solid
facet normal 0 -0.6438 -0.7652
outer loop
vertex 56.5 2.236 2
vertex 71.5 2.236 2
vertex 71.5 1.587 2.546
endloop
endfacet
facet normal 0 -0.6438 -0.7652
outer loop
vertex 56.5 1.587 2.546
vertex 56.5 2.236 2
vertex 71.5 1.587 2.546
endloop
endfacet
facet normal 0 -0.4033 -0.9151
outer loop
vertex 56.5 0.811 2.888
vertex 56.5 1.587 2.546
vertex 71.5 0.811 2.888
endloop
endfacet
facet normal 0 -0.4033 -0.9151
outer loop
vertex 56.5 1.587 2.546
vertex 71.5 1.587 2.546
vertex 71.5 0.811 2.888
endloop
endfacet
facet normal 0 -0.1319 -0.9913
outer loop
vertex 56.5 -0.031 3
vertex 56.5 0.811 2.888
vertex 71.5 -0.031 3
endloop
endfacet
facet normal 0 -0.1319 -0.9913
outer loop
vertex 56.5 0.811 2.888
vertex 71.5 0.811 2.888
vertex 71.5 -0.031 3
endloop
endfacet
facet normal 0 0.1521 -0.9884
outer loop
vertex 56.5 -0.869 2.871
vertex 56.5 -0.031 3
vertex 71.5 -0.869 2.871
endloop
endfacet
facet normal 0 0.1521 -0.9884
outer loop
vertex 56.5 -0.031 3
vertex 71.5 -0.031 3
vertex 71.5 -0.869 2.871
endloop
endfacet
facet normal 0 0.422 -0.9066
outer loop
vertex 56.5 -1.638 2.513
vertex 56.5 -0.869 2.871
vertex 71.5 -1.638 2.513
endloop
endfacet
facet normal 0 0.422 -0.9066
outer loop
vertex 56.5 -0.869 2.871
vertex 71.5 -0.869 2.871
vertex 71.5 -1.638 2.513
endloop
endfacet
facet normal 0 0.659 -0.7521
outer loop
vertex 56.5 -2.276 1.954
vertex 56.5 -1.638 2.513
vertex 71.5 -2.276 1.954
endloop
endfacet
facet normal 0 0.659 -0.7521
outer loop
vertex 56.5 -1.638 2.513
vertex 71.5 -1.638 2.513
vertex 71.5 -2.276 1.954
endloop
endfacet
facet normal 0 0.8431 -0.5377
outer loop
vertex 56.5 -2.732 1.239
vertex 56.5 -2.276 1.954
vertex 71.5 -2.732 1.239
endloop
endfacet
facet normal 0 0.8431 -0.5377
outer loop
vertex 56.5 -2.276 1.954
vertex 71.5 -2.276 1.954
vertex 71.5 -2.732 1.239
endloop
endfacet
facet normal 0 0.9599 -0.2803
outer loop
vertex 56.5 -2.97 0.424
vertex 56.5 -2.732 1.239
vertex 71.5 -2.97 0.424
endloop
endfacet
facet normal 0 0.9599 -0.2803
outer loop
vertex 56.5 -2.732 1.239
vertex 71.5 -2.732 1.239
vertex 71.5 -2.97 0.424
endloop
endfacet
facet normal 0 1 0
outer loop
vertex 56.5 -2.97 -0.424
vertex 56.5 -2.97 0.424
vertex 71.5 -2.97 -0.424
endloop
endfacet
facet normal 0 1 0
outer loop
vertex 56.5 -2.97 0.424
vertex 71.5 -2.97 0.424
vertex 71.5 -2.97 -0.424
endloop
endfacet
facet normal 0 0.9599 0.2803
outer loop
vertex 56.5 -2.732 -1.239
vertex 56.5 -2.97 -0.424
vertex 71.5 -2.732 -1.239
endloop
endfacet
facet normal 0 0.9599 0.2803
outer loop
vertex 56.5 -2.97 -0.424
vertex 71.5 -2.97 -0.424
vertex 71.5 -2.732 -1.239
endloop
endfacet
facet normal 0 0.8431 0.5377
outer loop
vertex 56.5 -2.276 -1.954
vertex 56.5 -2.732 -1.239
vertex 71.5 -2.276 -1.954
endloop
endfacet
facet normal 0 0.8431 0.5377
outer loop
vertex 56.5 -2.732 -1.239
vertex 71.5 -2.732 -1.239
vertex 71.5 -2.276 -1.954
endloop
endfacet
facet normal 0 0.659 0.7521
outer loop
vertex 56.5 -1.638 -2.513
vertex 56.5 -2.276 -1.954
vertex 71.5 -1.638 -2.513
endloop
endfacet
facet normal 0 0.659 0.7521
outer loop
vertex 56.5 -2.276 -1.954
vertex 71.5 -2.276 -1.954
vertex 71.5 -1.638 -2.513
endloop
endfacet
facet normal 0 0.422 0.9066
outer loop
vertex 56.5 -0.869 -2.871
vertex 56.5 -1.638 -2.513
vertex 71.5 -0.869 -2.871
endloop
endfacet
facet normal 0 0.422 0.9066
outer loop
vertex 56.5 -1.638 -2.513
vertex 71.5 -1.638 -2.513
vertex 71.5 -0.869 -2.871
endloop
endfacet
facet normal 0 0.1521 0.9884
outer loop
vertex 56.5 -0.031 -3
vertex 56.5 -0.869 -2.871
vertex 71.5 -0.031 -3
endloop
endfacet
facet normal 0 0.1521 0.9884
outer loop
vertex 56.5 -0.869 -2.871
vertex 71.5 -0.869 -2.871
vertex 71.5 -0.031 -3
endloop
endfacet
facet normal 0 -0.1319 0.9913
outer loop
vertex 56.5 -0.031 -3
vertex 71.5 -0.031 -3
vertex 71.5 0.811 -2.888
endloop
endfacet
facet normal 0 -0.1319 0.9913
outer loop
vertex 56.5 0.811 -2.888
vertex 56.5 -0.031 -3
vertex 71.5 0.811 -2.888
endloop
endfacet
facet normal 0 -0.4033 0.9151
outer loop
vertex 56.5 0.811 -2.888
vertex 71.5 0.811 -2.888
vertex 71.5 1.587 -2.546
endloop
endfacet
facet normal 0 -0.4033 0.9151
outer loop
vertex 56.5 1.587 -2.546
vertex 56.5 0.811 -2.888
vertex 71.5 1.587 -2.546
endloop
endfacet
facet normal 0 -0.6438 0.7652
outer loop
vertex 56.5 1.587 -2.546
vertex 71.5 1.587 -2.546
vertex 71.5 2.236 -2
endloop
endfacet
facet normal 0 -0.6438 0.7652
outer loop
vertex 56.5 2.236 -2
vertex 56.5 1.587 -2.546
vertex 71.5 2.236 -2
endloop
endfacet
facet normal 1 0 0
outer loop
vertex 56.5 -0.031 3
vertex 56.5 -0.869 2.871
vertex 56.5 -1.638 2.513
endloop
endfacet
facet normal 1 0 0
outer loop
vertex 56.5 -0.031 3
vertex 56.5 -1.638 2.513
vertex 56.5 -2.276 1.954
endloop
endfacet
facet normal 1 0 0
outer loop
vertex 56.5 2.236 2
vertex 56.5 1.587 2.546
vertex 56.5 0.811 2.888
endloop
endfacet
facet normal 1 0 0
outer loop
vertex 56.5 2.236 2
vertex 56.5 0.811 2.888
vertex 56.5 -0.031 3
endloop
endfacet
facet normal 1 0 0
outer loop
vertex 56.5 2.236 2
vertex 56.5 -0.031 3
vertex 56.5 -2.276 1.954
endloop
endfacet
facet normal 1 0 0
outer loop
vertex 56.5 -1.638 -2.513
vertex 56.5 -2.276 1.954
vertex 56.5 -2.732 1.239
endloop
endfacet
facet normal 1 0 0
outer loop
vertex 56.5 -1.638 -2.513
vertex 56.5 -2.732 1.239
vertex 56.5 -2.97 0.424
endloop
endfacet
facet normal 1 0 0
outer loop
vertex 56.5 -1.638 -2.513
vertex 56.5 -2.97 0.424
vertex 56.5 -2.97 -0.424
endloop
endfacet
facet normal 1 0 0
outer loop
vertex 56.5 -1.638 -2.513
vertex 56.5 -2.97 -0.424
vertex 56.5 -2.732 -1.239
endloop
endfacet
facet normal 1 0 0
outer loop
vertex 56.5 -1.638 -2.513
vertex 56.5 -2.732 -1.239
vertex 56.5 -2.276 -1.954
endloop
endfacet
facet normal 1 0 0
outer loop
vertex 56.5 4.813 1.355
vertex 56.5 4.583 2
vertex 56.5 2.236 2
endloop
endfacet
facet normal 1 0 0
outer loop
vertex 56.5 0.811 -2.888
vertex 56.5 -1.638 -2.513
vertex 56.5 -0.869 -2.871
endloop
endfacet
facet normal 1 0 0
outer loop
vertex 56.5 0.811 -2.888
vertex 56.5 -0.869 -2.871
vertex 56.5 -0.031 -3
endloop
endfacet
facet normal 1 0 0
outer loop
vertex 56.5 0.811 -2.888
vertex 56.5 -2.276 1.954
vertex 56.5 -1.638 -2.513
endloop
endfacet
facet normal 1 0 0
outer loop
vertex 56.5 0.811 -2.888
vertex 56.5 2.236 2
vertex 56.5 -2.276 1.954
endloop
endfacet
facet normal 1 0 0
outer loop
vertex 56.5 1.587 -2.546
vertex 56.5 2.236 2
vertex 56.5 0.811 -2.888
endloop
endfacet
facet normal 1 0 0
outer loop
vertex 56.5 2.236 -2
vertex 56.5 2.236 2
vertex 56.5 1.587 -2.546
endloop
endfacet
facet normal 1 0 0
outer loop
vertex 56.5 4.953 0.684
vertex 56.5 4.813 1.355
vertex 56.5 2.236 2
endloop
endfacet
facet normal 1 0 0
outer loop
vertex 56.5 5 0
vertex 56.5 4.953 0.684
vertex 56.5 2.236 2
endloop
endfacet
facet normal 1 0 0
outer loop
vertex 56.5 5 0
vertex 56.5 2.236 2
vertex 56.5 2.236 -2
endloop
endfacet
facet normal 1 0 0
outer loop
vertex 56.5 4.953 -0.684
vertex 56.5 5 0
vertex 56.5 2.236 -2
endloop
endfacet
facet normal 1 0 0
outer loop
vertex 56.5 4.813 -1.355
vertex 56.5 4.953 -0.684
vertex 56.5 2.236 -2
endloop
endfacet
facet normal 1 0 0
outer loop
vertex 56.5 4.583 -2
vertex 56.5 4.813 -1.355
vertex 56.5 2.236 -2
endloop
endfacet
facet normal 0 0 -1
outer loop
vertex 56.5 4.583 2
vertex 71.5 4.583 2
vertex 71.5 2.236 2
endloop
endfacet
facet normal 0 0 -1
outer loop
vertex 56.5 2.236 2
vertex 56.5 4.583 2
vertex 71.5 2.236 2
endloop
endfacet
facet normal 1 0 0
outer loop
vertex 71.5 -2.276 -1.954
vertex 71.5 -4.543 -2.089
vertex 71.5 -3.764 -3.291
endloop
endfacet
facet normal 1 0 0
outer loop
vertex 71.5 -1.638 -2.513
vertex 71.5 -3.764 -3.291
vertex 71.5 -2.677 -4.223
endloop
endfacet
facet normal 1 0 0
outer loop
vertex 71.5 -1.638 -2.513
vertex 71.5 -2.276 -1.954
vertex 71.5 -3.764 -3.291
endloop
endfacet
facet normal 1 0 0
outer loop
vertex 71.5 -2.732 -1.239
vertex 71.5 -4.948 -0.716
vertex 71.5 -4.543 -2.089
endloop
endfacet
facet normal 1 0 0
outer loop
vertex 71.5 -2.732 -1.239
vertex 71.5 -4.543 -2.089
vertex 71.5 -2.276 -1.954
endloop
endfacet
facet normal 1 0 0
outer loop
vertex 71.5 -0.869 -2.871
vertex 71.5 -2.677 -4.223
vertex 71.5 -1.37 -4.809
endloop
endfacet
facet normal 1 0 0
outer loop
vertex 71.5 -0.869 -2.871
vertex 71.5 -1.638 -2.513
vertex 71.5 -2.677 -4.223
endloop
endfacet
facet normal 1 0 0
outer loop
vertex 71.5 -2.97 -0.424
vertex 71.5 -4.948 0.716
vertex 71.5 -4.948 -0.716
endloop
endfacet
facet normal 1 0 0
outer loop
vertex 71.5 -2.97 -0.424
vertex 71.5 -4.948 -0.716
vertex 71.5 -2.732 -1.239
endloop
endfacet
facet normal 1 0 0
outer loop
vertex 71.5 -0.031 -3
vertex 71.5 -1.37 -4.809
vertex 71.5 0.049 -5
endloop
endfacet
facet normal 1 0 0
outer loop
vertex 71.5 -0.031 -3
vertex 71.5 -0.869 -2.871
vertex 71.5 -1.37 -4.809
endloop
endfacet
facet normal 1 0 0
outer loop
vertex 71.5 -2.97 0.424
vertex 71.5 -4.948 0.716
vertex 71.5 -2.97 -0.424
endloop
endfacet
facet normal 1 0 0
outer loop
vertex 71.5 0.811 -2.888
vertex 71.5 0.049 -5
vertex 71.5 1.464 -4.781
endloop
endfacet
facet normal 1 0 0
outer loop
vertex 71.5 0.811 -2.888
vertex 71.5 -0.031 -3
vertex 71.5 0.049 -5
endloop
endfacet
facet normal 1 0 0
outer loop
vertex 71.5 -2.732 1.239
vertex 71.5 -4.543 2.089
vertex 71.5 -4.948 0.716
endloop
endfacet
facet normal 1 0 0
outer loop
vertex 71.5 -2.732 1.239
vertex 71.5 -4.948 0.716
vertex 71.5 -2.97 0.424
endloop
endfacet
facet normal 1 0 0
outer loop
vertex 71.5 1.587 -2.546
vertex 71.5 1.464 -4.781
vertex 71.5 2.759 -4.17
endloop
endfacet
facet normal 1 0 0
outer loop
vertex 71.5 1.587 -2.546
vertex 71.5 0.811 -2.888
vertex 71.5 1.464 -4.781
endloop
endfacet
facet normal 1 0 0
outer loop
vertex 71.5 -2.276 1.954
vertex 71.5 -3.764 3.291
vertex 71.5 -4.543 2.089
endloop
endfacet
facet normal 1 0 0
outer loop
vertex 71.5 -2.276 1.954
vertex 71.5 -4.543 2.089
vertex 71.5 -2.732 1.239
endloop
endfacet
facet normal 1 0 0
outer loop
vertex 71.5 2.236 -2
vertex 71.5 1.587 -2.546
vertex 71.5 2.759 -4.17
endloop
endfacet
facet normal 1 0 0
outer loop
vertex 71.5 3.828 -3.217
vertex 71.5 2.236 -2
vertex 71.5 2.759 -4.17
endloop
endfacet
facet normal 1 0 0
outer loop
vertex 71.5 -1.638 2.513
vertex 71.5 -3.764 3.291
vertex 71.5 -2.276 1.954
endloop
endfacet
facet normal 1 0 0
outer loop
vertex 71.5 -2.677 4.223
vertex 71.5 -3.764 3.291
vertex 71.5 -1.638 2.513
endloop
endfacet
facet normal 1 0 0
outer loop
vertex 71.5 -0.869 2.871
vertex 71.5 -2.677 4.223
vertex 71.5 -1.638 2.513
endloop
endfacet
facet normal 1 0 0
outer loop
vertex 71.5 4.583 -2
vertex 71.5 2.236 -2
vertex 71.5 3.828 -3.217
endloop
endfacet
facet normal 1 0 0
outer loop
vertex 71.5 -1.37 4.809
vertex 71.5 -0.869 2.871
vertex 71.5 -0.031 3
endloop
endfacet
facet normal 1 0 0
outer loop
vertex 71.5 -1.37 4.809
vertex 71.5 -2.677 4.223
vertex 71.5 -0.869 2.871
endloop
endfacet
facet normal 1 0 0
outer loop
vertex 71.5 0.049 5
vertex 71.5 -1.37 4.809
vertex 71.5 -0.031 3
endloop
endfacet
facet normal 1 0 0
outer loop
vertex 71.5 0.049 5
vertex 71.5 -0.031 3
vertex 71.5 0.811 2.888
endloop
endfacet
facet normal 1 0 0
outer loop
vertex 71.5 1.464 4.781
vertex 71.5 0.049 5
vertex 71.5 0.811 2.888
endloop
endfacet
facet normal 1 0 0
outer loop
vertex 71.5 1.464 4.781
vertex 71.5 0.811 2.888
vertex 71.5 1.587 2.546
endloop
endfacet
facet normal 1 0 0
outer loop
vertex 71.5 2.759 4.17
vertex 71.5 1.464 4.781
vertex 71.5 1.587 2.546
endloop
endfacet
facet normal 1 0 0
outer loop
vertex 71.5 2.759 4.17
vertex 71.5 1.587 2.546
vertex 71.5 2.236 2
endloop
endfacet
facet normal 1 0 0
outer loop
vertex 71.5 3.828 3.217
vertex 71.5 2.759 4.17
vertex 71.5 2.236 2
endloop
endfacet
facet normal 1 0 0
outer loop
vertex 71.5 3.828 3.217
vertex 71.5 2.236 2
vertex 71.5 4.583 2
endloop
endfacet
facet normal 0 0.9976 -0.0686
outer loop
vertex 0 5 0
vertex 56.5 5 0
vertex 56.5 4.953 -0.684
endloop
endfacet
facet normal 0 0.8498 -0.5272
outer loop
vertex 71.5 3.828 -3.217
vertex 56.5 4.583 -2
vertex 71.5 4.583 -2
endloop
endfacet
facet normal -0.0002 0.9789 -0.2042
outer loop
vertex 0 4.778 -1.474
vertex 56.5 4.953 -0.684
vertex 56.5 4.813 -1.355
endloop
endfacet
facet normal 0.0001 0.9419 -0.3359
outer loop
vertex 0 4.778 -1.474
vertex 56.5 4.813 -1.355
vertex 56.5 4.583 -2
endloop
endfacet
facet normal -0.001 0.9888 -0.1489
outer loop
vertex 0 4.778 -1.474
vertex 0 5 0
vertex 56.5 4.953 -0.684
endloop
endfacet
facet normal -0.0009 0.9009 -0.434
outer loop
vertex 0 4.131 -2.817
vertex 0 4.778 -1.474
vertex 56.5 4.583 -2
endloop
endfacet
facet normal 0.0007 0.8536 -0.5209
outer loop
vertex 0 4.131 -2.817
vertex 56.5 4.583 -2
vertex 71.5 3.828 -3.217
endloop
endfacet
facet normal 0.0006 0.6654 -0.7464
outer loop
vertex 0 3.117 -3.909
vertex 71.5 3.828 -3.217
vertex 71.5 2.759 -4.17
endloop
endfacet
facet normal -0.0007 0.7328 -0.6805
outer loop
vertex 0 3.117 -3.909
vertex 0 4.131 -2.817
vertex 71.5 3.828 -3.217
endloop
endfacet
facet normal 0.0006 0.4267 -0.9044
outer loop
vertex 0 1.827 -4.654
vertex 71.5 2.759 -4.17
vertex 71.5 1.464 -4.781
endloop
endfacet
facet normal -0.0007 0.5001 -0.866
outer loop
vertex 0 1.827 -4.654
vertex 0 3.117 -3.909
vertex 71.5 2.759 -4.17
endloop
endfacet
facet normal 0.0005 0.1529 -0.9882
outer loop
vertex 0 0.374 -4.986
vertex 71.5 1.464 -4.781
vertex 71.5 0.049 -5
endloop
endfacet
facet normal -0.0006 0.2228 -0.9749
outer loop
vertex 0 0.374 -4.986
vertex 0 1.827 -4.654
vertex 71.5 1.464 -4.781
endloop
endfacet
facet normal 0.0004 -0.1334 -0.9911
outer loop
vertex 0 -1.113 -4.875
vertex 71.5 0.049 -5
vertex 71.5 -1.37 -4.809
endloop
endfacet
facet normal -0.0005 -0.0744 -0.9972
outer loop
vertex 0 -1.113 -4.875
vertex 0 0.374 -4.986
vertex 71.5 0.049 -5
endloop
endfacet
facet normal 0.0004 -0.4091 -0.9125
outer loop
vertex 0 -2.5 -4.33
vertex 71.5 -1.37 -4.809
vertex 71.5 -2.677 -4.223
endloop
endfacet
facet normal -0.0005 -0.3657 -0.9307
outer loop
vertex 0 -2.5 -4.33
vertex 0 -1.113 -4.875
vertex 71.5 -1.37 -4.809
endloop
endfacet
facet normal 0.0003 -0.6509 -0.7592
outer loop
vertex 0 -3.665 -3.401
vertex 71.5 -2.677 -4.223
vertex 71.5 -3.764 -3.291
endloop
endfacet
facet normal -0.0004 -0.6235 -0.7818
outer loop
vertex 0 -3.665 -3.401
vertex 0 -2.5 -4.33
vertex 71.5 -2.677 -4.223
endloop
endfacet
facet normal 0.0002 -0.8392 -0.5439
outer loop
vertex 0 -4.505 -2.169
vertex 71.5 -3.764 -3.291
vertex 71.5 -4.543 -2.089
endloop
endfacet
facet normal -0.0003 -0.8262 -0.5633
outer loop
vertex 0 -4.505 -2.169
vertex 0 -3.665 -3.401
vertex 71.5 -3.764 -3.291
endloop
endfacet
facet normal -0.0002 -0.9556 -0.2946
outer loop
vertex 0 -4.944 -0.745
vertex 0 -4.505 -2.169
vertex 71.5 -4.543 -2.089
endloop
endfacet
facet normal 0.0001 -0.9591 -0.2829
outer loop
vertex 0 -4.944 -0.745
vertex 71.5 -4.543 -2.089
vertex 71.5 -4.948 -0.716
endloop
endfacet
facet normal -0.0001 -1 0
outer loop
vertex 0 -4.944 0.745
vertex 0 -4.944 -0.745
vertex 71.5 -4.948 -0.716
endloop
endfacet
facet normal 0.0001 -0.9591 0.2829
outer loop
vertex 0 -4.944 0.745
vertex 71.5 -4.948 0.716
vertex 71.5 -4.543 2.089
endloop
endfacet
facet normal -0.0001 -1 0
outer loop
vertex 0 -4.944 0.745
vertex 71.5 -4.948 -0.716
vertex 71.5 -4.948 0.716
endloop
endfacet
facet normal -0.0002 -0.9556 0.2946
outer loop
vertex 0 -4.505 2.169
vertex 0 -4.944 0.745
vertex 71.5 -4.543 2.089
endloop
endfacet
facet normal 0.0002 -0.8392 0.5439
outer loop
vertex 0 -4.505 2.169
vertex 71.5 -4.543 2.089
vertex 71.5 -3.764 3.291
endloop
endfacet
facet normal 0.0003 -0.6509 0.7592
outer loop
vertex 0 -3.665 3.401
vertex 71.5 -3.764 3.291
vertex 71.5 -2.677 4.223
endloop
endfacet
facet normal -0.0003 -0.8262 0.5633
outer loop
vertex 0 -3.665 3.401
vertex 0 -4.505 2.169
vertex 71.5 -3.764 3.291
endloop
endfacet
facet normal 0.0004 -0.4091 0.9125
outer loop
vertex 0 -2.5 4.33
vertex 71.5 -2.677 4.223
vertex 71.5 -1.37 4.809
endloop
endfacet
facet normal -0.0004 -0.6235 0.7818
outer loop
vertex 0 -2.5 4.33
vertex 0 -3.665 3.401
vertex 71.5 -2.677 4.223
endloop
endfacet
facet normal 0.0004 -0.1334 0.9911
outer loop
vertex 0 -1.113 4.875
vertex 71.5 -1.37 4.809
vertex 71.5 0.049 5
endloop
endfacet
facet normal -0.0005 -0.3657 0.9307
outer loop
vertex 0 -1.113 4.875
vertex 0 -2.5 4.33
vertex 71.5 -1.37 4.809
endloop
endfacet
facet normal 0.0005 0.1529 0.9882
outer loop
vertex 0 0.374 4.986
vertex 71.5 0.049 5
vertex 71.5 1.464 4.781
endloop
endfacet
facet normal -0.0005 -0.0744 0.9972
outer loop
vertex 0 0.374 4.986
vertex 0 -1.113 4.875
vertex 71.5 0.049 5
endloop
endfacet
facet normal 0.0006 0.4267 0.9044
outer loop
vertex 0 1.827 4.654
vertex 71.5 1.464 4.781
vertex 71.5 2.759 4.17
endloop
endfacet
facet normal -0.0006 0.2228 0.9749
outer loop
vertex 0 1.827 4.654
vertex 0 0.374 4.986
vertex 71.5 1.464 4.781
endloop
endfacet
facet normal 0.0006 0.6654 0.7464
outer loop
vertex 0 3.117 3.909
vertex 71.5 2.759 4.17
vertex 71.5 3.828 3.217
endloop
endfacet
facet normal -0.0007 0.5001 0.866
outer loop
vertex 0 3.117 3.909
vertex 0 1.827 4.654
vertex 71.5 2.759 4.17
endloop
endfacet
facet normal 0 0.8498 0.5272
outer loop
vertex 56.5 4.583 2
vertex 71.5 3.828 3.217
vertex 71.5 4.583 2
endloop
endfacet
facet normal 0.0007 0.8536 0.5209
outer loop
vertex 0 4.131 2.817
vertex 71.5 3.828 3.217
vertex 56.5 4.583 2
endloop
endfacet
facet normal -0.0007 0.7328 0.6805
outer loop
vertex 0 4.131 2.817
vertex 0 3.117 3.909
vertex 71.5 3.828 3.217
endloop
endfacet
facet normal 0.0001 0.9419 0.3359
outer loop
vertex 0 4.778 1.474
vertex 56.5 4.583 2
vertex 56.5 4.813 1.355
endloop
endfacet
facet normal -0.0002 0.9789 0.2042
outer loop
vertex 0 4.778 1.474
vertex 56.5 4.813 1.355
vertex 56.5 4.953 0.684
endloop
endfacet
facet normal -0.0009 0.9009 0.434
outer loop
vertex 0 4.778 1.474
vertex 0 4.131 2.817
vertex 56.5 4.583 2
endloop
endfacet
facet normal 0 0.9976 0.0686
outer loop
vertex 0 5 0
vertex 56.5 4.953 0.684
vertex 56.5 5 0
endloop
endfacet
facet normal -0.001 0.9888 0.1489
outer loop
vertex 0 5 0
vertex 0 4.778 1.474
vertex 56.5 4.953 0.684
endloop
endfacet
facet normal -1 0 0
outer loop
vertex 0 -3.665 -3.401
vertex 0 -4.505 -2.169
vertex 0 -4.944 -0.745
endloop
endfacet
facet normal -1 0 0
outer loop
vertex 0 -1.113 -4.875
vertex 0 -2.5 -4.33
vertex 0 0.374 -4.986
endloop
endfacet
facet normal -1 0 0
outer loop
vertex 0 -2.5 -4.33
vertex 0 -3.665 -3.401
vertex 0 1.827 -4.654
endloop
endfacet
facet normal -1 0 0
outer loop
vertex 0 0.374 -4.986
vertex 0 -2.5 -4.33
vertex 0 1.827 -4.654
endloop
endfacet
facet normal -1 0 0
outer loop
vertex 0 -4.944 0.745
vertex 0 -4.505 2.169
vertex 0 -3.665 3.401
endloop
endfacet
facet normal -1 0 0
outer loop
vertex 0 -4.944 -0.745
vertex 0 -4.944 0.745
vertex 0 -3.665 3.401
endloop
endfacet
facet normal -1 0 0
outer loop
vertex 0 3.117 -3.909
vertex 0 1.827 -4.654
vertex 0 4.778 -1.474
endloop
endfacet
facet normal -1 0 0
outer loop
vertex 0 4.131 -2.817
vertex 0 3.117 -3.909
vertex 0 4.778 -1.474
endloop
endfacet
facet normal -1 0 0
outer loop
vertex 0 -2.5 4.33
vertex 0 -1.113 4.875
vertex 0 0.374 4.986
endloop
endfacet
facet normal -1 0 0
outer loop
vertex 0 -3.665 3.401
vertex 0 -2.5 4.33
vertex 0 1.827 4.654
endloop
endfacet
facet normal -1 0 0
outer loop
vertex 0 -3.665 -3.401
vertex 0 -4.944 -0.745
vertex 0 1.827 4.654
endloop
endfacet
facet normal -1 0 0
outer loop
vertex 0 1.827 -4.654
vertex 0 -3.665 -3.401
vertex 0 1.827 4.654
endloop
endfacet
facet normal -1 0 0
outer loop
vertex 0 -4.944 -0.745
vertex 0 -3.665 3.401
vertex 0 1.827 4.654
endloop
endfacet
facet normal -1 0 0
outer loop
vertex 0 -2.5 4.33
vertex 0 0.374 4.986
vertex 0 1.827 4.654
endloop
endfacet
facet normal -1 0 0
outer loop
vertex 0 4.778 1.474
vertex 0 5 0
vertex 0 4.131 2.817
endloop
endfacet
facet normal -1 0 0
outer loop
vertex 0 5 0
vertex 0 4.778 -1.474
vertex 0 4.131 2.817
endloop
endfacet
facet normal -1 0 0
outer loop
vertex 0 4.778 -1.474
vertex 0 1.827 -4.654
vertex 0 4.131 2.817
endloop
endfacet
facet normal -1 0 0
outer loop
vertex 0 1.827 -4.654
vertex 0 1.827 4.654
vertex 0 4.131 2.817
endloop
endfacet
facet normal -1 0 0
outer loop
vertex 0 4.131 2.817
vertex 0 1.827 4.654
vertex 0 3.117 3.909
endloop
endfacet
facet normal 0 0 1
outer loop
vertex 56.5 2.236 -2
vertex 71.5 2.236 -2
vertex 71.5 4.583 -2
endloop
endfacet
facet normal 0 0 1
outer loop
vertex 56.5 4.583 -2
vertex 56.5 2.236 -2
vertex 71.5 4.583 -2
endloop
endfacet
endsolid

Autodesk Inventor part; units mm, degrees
ref_plane "YZ Plane" through (0, 0, 0) normal (1, 0, 0) x (0, 1, 0)
ref_plane "XZ Plane" through (0, 0, 0) normal (0, 1, 0) x (-1, 0, 0)
ref_plane "XY Plane" through (0, 0, 0) normal (0, 0, 1) x (1, 0, 0)
sketch "スケッチ1" plane through (0, 0, 0) normal (1, 0, 0) x (0, 1, 0)
  circle A0 centre (0, 0) radius 5
  dimension "d0" = 10
extrude "押し出し1" add sketch "スケッチ1" along normal blind 71.5
sketch "スケッチ2" plane through (71.5, 0, 0) normal (1, 0, 0) x (0, 0, -1)
  circle A0 centre (0, 0) radius 3
  line L0 (-2, 5.6235) -> (-2, 0.6448)
  line L1 (-2, 0.6448) -> (2, 0.6448)
  line L2 (2, 0.6448) -> (2, 6.3088)
  line L3 (-2, 5.6235) -> (2, 5.6235)
  point P0 (-2, 2.2361)
  point P1 (2, 2.2361)
  dimension "d3" = 6
  dimension "d4" = 2
  dimension "d5" = 2
extrude "押し出し2" cut sketch "スケッチ2" against normal blind 15
properties part number "RZvector-arm-rotate-v1-Shaft-MM5-Shaft" material "アルミニウム 6061"
